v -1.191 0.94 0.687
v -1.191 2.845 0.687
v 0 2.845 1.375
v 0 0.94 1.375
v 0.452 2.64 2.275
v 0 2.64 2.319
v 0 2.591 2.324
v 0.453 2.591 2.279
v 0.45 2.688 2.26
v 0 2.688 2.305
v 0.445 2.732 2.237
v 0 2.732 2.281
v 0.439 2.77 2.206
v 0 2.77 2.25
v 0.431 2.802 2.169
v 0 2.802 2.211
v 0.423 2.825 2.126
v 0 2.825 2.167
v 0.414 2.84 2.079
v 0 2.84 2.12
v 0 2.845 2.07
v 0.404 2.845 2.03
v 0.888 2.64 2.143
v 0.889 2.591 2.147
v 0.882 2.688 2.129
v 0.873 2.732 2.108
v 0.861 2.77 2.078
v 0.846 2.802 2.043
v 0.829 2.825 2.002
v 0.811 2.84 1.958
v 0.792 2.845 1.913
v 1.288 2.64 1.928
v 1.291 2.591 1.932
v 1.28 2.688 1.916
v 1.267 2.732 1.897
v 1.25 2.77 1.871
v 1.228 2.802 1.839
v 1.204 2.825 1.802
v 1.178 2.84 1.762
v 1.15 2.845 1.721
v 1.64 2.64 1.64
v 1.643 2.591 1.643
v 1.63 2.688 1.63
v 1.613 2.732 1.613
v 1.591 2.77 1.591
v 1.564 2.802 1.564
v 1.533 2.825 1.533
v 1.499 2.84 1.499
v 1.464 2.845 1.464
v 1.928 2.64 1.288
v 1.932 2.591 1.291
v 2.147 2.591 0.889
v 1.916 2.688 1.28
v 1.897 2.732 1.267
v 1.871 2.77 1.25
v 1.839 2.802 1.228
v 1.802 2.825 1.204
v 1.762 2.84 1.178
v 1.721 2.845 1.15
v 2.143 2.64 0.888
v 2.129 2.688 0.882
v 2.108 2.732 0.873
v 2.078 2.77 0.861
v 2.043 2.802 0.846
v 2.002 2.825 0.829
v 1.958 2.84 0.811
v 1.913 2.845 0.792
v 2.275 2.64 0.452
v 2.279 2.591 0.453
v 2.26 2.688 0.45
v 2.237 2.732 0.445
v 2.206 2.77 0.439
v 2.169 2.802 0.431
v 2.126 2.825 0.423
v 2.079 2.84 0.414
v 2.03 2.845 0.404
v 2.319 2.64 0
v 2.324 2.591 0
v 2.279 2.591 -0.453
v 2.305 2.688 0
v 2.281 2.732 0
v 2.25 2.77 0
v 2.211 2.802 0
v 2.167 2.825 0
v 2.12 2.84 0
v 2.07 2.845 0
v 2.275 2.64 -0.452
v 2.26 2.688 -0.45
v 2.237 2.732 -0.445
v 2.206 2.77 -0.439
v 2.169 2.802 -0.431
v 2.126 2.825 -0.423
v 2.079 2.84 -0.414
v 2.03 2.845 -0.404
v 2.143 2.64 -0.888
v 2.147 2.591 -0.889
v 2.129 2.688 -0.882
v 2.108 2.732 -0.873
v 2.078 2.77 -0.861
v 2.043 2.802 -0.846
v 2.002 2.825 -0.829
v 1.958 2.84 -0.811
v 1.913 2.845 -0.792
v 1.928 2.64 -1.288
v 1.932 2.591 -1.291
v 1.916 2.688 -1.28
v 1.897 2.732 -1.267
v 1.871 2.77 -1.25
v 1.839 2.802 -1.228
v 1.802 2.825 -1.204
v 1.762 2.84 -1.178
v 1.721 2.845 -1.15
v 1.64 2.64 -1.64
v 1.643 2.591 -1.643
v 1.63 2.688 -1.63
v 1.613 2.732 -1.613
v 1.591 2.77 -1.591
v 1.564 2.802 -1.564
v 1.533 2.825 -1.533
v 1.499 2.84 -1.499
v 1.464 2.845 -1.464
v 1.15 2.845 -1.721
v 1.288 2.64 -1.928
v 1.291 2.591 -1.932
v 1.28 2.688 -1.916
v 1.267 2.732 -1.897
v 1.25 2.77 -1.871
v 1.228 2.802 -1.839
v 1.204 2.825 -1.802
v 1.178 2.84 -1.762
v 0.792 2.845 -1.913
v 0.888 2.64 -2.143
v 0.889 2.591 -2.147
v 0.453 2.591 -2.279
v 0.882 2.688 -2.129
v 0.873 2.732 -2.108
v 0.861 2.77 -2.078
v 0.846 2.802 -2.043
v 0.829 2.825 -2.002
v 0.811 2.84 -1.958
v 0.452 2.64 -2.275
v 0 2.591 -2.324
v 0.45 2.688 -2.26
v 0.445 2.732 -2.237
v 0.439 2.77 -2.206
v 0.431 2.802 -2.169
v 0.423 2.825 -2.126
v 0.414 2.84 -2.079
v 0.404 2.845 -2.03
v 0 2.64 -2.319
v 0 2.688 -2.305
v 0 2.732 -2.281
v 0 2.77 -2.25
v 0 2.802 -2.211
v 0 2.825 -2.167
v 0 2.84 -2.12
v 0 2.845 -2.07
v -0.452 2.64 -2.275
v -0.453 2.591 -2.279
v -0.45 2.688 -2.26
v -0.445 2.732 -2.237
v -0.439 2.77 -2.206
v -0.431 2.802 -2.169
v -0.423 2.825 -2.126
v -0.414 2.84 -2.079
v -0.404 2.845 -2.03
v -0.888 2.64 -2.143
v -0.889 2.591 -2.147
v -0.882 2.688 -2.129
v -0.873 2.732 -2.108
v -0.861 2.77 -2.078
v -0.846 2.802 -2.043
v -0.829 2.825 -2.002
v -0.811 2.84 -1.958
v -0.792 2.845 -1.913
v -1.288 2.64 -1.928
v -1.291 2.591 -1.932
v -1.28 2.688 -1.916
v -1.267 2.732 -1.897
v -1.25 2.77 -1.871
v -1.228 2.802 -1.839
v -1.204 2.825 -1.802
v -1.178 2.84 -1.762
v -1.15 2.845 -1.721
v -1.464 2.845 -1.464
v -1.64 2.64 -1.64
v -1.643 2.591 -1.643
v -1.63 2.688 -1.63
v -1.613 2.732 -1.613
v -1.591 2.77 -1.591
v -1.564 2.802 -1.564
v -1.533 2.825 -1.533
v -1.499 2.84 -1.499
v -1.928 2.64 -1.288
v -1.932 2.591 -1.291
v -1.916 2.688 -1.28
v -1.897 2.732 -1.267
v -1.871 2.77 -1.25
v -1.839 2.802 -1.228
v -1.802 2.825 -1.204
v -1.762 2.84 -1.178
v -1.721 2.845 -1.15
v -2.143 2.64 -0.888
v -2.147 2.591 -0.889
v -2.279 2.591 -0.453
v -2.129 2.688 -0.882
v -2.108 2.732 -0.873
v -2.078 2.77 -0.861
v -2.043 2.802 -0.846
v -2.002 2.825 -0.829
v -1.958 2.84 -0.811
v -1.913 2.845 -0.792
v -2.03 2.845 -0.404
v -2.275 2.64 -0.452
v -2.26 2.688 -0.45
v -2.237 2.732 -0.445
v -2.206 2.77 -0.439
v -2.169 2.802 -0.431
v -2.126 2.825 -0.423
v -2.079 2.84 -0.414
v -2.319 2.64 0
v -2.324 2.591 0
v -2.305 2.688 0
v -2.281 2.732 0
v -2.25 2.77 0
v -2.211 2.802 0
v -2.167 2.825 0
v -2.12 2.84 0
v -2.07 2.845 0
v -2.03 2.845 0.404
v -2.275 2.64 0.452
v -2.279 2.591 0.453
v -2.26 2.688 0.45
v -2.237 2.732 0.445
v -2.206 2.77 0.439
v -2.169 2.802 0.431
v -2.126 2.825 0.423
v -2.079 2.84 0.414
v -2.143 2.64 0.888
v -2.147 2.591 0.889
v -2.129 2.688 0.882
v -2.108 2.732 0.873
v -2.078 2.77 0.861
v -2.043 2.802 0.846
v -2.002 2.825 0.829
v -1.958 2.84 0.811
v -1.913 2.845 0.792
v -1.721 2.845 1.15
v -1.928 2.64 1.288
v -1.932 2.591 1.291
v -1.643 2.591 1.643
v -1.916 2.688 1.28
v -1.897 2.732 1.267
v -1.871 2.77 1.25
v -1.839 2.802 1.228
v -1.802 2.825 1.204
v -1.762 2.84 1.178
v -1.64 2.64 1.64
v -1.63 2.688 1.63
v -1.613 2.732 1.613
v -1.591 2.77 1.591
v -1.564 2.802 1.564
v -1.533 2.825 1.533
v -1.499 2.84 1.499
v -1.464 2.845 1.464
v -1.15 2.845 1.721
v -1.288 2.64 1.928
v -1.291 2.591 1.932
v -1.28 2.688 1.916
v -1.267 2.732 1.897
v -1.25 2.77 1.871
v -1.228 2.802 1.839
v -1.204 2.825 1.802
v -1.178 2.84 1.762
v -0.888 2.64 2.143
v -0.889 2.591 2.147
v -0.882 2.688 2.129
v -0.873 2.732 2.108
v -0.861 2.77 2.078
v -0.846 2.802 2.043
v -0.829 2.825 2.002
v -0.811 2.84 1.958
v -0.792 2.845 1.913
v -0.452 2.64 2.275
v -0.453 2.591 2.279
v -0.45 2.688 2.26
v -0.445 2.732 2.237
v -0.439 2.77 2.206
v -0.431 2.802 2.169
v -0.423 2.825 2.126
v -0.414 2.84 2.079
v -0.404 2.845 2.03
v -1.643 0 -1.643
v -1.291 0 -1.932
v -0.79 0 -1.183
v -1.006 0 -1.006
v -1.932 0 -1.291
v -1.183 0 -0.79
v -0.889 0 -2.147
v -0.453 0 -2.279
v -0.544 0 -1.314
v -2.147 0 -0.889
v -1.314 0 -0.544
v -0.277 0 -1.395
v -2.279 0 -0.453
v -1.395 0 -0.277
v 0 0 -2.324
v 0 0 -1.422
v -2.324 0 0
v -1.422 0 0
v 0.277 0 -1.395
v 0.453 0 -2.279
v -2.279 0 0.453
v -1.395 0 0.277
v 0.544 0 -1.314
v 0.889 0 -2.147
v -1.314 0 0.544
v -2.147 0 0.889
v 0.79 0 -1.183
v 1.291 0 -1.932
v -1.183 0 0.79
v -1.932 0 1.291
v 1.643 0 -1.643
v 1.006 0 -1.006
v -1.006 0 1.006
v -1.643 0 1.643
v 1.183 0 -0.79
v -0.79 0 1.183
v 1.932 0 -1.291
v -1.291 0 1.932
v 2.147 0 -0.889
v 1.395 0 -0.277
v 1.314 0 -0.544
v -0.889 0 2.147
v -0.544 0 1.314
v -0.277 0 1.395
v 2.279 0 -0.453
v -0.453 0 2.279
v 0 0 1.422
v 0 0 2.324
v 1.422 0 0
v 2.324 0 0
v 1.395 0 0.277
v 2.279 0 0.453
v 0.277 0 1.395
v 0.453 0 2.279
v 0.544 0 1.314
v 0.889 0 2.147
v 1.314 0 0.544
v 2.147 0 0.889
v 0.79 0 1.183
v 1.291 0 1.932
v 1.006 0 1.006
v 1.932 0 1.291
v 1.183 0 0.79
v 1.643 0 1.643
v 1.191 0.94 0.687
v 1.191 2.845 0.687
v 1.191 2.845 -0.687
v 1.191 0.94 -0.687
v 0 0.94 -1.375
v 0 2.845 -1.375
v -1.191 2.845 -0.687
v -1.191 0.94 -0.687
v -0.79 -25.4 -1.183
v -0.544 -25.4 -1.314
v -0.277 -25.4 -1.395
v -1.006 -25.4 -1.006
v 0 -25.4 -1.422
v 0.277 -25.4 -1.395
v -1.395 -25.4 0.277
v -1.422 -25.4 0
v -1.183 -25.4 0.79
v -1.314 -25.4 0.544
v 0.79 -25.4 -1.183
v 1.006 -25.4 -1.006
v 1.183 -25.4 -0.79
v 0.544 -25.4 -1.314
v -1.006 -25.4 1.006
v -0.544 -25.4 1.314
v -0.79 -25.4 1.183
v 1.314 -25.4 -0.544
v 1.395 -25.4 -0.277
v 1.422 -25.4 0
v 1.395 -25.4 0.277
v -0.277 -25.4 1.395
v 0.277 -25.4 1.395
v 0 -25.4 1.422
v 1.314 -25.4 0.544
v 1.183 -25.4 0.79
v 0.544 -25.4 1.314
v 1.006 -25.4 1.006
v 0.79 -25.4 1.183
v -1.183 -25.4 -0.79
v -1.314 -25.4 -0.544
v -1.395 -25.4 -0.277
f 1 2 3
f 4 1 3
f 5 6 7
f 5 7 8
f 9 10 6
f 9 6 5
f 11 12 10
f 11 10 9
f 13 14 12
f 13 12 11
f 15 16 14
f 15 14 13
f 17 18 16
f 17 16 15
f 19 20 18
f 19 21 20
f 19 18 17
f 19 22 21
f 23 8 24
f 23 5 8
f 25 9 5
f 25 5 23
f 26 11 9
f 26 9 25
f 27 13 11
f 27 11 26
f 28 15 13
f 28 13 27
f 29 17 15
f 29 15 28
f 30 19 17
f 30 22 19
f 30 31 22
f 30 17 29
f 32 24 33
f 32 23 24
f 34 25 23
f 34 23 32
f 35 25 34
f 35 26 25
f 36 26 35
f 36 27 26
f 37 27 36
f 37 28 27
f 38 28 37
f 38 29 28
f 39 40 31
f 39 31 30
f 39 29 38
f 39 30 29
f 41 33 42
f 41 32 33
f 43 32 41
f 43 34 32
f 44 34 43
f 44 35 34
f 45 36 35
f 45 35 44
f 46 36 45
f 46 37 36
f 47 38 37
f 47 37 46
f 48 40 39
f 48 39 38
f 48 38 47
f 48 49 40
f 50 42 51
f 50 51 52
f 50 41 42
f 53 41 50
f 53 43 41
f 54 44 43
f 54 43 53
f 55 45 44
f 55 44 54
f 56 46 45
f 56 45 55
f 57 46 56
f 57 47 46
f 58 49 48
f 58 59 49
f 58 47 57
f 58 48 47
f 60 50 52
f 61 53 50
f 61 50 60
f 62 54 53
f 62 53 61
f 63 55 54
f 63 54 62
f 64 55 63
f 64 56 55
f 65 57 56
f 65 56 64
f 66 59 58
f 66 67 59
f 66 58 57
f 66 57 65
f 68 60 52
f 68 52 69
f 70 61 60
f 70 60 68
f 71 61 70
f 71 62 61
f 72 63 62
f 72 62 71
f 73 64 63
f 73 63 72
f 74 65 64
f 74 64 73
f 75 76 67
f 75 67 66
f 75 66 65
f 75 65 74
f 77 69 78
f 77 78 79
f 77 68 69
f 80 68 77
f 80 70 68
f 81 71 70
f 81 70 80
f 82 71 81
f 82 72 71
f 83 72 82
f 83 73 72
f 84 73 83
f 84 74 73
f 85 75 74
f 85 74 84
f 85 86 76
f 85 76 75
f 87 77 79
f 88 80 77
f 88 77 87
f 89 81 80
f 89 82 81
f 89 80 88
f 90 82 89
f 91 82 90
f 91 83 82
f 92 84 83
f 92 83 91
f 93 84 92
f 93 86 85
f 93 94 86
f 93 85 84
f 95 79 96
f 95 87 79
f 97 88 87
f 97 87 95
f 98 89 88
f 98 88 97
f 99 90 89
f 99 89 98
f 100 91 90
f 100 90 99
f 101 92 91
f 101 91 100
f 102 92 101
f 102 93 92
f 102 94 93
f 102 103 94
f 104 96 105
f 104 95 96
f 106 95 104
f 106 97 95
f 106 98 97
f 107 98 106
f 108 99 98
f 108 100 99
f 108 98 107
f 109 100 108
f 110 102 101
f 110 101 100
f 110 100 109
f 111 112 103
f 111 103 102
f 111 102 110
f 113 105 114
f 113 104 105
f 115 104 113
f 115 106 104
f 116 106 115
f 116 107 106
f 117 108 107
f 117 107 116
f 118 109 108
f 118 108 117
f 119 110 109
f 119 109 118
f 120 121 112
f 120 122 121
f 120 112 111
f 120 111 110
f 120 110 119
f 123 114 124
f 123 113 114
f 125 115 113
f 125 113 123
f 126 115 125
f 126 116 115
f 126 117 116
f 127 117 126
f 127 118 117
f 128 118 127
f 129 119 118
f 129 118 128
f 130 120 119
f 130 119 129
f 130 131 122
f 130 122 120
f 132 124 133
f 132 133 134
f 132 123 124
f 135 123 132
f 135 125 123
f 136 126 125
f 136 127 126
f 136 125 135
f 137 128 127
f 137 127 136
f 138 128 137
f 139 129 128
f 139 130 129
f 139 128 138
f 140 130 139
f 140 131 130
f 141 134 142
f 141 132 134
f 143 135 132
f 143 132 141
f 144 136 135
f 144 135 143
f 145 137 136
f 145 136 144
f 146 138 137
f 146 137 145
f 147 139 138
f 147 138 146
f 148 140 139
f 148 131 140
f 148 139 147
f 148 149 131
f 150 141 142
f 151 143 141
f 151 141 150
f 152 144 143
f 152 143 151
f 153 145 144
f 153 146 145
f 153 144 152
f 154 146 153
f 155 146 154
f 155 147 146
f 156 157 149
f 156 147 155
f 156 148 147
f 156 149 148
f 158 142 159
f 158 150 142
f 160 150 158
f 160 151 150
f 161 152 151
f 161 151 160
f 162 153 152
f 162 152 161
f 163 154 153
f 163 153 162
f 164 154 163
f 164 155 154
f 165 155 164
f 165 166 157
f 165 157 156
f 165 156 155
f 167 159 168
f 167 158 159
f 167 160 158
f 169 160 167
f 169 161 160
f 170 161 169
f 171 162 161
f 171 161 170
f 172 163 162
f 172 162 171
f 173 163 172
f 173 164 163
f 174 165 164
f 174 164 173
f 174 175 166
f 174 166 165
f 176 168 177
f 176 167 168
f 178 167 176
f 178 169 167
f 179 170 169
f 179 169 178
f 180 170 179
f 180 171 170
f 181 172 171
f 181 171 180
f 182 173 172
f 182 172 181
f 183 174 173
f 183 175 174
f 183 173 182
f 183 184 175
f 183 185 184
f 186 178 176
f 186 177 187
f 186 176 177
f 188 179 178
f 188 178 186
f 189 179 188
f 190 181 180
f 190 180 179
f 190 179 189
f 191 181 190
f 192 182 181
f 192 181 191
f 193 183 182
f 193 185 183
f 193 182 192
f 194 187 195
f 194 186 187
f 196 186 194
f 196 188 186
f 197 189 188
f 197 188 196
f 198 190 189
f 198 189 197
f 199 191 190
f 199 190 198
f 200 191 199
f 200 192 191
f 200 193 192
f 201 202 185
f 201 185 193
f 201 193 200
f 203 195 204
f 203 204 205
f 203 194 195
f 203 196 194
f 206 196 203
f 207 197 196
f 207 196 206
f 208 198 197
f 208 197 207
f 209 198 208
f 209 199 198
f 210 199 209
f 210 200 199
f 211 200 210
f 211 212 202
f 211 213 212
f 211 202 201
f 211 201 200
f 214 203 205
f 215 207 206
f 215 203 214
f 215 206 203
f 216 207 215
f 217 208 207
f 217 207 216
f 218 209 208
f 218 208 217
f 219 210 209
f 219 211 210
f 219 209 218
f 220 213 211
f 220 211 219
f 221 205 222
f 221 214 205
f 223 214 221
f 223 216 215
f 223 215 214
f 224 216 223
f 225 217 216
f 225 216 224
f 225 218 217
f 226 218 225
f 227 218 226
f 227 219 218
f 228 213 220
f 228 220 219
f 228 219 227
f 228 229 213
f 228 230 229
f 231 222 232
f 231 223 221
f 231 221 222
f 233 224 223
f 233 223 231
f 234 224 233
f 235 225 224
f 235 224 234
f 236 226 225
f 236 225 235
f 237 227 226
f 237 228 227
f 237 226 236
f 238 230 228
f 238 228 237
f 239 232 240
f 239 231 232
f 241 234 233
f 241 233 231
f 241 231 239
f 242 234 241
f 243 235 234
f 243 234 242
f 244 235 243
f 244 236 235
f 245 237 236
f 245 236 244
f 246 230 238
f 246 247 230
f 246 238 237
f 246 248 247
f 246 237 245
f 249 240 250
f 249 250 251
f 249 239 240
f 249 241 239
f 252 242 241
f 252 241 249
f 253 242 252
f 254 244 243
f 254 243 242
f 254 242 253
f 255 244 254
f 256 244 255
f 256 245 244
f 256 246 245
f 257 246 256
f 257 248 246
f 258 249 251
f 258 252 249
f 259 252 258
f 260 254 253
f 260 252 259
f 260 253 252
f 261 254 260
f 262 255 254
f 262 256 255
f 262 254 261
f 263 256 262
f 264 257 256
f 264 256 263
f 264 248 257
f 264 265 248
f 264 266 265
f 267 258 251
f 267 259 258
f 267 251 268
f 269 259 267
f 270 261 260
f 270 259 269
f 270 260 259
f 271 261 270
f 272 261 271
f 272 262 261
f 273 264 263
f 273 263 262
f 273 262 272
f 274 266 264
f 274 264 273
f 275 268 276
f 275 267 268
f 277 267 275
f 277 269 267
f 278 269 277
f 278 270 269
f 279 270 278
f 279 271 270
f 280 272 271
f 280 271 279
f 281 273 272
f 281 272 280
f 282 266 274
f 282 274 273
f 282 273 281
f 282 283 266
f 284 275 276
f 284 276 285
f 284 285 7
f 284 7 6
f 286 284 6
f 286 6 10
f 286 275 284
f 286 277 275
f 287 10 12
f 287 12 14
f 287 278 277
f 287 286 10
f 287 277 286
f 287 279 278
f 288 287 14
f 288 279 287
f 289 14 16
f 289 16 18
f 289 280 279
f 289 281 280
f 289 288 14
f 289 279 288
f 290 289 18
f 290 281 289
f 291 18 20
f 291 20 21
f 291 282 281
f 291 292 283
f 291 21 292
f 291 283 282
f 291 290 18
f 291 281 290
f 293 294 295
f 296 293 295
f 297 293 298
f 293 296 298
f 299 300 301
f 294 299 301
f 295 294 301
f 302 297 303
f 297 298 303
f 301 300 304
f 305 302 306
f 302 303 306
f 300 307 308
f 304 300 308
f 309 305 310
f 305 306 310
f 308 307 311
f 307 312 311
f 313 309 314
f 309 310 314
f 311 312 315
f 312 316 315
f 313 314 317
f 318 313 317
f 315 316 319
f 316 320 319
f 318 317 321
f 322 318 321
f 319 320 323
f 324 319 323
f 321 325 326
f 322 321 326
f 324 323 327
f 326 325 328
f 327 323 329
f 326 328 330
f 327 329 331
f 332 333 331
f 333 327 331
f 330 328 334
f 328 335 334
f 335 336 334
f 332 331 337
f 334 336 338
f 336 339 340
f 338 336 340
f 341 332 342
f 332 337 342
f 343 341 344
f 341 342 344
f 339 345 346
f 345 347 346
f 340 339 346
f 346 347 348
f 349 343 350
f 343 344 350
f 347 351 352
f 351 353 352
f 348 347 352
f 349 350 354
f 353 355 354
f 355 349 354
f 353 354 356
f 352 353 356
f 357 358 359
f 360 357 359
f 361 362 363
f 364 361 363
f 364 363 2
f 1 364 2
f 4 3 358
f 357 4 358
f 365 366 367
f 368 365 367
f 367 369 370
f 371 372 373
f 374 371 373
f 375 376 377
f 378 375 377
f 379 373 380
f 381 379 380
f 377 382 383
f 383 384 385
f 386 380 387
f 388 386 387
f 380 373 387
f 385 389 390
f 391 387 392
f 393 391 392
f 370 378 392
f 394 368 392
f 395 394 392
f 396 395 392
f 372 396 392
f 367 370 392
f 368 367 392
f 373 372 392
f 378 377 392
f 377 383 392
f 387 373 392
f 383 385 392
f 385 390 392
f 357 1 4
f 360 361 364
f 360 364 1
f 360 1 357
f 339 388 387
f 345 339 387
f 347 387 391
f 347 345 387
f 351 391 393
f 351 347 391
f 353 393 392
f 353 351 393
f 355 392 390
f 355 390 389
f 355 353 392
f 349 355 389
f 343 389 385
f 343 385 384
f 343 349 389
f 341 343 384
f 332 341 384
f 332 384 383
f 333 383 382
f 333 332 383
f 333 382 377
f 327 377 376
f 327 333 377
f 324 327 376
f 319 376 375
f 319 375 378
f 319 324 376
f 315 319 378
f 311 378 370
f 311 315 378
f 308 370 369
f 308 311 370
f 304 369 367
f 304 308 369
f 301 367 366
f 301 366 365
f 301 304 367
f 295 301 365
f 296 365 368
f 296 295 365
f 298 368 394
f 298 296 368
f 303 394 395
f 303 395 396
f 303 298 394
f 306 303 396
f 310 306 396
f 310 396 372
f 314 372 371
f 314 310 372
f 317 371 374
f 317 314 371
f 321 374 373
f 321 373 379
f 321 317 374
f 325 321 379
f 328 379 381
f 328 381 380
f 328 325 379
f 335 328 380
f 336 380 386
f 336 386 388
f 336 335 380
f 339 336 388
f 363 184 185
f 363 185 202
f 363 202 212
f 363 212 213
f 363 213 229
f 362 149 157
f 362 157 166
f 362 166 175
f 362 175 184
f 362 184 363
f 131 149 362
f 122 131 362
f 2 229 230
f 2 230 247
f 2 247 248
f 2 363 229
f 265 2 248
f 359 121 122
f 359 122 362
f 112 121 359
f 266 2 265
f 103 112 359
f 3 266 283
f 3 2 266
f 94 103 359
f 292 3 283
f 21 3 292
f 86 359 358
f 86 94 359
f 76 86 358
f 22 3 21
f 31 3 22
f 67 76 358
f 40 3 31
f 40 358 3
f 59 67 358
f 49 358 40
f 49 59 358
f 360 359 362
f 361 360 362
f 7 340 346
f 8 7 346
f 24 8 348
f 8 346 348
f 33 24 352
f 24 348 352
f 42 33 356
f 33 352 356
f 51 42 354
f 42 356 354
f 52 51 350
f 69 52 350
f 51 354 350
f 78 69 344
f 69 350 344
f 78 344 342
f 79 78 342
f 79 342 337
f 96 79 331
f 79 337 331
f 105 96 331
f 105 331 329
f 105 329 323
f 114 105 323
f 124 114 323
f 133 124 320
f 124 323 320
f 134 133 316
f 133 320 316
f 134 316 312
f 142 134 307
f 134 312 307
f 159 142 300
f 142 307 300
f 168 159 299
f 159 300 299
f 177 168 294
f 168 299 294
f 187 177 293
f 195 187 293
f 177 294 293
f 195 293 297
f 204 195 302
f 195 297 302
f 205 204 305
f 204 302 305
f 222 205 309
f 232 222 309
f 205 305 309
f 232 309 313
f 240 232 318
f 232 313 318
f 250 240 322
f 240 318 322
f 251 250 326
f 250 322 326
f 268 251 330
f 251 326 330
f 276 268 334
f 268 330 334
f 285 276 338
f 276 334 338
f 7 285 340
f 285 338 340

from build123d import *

# Parameters (mm, degrees)
SKETCH1_R   = 1.4224
SHAFT_DEPTH = 25.4
SKETCH2_R   = 2.3241
HEAD_DEPTH  = 2.8448
FILLET1_R   = 0.254
HEX_2_DEPTH = 1.905


with BuildPart() as part:
    # Sketch1 → Shaft (new body)
    with BuildSketch(Plane(origin=(0, 0, 0), x_dir=(1, 0, 0), z_dir=(0, 1, 0))):
        with Locations(Location((0, 0, 0), (0, 0, 270))):
            Circle(SKETCH1_R)
    extrude(amount=-SHAFT_DEPTH)

    # Sketch2 → Head (add)
    with BuildSketch(Plane(origin=(0, 0, 0), x_dir=(1, 0, 0), z_dir=(0, 1, 0))):
        with Locations(Location((0, 0, 0), (0, 0, 270))):
            Circle(SKETCH2_R)
    extrude(amount=HEAD_DEPTH)

    # Fillet1
    fillet1_edges = [part.edges().sort_by_distance(p)[0] for p in [
        (0, 2.8448, -2.3241),
    ]]
    fillet(fillet1_edges, radius=FILLET1_R)

    # Sketch3 → Hex 2 (cut)
    with BuildSketch(Plane(origin=(0, 2.8448, 0), x_dir=(1, 0, 0), z_dir=(0, 1, 0))):
        Polygon((0, 1.374815329), (-1.190625, 0.687407664), (-1.190625, -0.687407664), (0, -1.374815329), (1.190625, -0.687407664), (1.190625, 0.687407664), align=None)
    extrude(amount=-HEX_2_DEPTH, mode=Mode.SUBTRACT)


solid = part.part
